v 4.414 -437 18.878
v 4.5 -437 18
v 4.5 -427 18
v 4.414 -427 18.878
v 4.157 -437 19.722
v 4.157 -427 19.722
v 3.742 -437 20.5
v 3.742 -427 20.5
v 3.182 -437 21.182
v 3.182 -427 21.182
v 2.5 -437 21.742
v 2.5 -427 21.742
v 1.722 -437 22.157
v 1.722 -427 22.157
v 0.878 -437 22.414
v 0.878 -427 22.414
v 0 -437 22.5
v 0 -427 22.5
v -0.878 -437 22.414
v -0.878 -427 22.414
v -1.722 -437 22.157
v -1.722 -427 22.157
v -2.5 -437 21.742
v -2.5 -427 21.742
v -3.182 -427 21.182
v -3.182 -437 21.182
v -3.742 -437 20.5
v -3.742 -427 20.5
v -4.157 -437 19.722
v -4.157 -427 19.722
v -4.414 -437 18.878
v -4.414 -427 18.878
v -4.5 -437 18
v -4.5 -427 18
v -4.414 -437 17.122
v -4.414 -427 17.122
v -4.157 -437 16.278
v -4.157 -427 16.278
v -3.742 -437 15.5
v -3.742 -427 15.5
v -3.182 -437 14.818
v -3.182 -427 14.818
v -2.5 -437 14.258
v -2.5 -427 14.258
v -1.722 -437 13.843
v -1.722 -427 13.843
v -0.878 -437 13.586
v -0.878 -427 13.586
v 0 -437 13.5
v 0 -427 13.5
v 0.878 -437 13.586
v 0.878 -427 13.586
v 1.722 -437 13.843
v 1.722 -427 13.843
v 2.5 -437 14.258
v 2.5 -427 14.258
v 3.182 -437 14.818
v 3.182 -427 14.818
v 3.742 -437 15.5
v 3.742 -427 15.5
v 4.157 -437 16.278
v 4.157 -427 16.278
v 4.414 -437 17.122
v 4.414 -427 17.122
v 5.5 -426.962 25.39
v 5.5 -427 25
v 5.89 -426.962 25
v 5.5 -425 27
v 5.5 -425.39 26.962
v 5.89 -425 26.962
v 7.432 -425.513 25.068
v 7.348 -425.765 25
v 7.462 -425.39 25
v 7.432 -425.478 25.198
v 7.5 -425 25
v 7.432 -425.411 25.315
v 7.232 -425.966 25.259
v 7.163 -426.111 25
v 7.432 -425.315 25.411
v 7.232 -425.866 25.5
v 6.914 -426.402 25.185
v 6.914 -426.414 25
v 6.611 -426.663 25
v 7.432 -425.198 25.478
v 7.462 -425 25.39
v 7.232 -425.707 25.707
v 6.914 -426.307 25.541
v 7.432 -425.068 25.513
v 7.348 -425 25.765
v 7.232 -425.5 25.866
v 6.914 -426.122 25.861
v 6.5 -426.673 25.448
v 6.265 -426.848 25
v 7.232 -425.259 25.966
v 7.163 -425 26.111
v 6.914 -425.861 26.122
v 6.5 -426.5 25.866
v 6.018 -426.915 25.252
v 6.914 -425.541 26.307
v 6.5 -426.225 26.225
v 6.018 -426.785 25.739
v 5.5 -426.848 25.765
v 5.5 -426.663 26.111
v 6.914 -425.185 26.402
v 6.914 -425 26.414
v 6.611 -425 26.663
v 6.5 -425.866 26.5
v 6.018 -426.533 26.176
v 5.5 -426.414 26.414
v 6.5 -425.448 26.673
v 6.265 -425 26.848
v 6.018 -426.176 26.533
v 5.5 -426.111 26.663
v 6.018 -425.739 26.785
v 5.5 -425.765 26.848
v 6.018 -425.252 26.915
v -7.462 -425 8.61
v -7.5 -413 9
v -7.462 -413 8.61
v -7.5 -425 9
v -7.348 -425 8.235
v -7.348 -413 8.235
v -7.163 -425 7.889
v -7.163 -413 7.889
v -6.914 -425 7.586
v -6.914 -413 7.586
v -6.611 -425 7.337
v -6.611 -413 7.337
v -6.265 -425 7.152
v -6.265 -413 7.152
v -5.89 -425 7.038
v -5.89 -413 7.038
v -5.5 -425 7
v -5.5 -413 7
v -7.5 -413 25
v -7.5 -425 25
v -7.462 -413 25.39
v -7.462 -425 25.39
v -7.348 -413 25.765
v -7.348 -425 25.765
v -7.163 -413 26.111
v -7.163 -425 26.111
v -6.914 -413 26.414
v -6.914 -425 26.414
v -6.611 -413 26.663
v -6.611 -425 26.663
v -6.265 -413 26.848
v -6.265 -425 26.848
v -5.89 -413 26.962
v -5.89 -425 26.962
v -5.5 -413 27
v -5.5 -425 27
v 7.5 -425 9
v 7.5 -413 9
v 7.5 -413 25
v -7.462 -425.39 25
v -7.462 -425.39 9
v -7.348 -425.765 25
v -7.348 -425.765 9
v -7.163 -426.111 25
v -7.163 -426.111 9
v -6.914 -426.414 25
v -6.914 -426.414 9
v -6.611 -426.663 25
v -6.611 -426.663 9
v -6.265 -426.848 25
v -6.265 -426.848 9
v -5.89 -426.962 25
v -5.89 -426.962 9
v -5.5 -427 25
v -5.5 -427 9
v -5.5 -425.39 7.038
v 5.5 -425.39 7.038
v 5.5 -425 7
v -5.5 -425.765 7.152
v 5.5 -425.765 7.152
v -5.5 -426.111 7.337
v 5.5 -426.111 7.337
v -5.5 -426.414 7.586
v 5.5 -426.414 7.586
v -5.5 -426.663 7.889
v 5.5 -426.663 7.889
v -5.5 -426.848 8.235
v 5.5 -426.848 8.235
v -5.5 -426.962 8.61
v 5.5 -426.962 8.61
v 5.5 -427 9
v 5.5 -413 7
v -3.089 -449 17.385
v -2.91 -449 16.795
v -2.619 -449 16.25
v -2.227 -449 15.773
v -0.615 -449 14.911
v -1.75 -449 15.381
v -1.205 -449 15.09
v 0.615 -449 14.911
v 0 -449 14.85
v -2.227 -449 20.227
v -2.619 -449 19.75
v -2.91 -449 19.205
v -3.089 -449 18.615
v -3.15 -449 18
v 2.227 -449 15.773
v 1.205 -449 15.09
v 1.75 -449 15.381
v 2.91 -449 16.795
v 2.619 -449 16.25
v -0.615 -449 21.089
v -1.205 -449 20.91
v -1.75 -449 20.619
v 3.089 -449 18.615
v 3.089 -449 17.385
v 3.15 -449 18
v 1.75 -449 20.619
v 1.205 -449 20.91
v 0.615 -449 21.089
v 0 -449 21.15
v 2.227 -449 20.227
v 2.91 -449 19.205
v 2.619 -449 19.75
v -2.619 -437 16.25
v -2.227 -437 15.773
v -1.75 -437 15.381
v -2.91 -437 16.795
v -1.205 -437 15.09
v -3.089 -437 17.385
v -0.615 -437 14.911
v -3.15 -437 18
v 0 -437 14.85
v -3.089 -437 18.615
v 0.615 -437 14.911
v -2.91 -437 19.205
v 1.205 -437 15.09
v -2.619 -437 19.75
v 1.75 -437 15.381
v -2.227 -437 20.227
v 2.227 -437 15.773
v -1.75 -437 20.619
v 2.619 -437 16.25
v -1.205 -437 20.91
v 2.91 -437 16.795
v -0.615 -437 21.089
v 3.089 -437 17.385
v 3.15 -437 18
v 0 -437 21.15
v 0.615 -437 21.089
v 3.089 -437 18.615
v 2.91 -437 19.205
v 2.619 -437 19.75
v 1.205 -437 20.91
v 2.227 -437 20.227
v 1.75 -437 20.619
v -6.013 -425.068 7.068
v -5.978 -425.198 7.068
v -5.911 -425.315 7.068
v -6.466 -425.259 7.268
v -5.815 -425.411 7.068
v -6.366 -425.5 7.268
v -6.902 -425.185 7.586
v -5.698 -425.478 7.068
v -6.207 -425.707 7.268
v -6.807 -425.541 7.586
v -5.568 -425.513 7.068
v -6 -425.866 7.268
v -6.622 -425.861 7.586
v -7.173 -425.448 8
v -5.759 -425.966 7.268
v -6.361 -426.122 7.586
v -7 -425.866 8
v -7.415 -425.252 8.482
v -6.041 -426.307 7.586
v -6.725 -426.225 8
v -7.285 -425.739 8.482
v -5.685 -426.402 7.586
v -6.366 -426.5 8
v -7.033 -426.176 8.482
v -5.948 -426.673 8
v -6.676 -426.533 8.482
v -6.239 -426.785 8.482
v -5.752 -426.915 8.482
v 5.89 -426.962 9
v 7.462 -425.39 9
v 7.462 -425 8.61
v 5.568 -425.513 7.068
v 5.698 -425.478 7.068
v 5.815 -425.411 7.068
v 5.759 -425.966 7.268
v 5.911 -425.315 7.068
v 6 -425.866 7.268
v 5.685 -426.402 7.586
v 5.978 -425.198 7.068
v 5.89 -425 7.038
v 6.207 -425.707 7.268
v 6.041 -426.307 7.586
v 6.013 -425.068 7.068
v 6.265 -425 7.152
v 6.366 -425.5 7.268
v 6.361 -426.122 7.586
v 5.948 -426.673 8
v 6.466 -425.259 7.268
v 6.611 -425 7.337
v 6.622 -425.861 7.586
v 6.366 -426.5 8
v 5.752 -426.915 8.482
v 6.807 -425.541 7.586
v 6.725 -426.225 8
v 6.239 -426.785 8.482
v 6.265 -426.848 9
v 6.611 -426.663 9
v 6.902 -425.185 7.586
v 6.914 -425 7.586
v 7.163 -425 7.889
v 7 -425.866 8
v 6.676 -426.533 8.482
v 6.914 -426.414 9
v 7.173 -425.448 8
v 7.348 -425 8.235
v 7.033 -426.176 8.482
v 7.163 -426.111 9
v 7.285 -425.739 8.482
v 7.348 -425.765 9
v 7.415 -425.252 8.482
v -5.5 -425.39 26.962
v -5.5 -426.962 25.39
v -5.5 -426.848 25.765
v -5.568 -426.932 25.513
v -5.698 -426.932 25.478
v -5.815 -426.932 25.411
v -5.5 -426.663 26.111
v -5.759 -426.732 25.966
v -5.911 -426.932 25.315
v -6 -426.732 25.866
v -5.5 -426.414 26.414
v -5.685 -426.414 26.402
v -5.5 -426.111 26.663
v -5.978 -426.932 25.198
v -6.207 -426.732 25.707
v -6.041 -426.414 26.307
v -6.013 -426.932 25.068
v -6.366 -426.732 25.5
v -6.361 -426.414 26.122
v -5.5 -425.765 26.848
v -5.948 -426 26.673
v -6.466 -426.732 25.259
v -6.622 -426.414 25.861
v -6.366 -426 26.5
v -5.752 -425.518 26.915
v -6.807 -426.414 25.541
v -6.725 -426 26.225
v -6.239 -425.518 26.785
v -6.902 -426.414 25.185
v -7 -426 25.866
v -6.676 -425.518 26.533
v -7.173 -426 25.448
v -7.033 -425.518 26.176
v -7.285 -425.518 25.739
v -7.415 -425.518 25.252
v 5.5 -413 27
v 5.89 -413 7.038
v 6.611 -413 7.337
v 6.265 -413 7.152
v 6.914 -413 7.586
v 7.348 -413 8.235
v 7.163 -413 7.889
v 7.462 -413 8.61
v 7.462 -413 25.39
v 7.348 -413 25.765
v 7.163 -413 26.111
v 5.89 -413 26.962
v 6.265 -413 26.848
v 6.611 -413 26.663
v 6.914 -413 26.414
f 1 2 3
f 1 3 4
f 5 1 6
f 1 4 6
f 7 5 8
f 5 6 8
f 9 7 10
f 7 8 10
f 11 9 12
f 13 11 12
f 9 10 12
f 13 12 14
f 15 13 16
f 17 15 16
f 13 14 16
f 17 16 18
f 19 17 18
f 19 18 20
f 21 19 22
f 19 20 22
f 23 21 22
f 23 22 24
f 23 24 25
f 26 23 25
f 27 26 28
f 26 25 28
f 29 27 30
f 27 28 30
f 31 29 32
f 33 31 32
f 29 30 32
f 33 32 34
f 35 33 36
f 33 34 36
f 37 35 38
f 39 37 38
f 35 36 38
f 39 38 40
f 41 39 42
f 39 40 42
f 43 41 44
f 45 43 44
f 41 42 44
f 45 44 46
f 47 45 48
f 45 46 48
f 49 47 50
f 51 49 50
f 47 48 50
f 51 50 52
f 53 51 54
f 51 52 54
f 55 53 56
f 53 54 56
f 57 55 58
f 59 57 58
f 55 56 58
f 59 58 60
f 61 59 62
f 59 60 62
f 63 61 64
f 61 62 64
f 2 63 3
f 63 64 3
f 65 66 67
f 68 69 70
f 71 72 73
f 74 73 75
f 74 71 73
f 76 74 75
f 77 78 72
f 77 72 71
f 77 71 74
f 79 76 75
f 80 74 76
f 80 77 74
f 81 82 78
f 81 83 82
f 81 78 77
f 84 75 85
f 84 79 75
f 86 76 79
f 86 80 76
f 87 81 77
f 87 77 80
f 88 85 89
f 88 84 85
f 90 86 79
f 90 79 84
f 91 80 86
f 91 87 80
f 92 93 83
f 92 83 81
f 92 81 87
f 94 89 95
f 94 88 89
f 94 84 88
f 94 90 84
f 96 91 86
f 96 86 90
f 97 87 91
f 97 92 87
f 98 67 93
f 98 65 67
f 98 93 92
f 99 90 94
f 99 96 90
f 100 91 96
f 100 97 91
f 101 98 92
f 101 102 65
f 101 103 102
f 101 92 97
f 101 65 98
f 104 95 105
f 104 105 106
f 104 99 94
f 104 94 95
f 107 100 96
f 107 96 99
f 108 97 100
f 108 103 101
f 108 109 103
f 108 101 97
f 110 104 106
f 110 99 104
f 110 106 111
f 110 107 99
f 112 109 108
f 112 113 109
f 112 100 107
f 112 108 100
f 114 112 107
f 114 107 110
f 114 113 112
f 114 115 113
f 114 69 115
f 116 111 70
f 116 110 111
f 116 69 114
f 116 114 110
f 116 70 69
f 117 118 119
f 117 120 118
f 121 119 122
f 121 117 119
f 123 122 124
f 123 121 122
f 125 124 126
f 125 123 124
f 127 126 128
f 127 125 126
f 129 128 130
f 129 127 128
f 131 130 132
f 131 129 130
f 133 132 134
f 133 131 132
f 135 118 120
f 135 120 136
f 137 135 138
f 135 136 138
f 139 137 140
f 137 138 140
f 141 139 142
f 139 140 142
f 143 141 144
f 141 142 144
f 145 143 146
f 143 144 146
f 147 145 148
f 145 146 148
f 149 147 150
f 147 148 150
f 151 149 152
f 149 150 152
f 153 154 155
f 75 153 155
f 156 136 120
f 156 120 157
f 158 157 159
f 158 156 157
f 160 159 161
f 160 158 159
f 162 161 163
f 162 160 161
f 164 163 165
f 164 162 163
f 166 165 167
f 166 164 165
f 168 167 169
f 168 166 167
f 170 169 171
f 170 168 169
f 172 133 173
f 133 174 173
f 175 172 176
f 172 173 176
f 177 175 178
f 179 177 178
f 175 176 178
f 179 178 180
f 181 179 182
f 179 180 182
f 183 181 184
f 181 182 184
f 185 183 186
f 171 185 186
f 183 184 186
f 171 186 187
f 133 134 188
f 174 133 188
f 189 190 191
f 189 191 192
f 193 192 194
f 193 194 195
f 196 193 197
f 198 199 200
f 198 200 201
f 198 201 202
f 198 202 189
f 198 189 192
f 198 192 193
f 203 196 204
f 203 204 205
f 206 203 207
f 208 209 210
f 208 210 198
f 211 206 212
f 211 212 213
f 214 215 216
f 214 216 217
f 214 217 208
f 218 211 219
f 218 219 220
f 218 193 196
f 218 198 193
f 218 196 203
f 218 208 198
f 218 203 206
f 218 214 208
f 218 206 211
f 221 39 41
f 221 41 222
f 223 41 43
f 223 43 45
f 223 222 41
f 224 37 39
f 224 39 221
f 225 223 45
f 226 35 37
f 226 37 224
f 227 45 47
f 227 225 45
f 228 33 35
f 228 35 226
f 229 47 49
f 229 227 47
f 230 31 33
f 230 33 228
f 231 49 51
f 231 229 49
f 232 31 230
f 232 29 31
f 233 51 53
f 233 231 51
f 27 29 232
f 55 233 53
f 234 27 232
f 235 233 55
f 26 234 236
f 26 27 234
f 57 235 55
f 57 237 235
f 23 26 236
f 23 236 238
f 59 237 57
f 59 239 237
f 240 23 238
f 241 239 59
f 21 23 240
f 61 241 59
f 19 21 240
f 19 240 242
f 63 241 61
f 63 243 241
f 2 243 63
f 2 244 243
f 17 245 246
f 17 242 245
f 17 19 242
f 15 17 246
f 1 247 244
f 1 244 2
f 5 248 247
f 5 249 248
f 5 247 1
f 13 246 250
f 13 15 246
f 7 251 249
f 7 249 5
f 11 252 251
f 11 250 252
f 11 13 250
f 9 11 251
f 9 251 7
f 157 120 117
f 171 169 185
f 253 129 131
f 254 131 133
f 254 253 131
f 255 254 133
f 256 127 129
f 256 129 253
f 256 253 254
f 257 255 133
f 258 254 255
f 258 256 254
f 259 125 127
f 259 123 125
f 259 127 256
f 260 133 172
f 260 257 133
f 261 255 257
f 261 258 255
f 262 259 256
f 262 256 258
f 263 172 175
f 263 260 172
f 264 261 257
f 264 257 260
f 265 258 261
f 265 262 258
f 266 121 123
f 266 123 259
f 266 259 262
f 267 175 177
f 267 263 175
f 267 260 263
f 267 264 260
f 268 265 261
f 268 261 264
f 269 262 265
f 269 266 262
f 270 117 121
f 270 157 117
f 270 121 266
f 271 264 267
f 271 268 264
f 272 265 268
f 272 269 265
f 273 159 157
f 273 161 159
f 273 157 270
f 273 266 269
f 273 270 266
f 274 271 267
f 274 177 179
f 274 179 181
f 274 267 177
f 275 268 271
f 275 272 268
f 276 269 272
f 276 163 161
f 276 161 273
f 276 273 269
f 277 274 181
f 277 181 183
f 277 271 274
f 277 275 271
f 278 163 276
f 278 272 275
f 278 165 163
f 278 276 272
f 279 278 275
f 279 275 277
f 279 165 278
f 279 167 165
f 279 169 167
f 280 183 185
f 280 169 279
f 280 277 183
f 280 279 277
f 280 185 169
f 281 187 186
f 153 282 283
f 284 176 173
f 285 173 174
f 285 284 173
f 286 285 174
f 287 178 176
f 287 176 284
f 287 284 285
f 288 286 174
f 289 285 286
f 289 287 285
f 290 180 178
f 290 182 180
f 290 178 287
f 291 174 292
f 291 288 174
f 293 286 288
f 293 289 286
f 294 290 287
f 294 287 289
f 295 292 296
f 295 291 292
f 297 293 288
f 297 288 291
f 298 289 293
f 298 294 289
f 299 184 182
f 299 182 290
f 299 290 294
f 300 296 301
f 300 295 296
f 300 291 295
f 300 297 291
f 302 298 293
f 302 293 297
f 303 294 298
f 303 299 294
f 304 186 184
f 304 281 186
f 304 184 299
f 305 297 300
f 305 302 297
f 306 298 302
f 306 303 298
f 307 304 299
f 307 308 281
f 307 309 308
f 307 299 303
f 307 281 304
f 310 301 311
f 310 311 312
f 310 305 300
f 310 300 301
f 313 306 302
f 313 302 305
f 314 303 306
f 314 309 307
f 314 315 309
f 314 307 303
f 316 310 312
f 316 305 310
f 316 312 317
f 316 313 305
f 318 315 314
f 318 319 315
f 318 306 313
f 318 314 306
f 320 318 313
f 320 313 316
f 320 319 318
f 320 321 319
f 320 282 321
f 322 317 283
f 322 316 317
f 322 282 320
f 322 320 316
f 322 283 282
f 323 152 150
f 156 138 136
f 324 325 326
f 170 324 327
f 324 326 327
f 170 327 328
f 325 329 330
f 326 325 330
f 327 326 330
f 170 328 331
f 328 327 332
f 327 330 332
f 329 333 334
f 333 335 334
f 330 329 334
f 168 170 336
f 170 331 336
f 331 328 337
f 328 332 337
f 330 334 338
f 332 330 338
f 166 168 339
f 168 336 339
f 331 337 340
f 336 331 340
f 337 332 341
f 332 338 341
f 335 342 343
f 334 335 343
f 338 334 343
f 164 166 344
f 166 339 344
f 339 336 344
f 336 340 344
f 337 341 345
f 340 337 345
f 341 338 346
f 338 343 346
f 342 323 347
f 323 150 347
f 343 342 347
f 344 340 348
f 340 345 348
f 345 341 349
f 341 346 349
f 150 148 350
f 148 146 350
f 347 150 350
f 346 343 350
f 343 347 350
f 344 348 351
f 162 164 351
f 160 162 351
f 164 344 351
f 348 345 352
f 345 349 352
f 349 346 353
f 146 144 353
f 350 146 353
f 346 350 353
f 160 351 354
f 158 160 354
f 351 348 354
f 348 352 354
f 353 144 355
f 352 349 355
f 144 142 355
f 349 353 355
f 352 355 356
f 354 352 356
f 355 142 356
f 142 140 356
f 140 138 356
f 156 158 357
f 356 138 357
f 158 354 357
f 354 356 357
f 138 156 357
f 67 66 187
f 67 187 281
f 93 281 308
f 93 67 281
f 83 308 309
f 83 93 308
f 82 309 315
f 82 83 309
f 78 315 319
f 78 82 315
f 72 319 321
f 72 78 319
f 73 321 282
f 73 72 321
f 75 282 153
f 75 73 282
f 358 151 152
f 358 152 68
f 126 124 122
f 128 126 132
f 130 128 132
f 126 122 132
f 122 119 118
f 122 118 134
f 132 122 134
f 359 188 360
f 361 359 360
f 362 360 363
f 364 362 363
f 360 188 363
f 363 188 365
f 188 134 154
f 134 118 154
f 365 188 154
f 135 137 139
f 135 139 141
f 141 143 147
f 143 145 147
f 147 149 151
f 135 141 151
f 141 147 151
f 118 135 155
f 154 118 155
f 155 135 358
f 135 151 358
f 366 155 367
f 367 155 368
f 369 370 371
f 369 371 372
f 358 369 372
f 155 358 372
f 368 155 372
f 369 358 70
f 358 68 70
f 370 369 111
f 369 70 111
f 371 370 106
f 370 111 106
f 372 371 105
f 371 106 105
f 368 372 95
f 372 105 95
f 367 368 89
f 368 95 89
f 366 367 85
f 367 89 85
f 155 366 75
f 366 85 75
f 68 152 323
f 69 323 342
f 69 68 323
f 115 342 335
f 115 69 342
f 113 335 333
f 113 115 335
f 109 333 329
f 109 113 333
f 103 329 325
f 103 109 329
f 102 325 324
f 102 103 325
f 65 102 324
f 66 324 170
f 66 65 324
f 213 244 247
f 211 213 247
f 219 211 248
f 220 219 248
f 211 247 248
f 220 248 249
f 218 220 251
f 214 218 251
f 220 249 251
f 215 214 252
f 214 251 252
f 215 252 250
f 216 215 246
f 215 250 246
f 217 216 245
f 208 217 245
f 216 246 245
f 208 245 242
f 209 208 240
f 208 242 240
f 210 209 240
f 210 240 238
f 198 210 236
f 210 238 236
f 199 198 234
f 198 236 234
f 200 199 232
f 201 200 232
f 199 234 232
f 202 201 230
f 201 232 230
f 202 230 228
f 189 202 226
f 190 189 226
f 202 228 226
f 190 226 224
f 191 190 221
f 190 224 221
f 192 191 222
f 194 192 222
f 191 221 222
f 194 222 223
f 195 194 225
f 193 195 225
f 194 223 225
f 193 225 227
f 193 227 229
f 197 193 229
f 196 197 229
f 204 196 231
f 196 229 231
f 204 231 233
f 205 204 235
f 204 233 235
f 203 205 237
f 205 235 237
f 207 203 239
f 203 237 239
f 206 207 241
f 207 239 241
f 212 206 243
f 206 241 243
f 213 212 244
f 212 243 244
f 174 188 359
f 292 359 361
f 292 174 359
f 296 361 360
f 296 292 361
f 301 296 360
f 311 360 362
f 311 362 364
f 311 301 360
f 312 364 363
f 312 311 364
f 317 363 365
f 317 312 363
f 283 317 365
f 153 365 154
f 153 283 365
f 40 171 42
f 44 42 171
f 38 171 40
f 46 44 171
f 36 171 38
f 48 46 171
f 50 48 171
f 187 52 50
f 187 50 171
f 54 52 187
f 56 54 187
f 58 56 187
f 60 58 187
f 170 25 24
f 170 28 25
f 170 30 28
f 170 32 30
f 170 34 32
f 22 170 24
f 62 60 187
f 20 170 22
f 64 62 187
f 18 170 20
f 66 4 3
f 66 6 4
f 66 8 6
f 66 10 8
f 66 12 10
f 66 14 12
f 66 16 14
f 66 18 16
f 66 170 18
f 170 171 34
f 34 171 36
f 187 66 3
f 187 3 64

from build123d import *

# Parameters (mm, degrees)
SKETCH001_W  = 15
SKETCH001_H  = 20
PAD001_DEPTH = 14
SKETCH002_R  = 4.5
PAD002_DEPTH = 10
SKETCH003_R  = 3.15
PAD003_DEPTH = 12
FILLET_R     = 2


with BuildPart() as part:
    # Sketch001 → Pad001 (new body)
    with BuildSketch(Plane.XZ):
        Rectangle(SKETCH001_W, SKETCH001_H)
    extrude(amount=PAD001_DEPTH)

    # Sketch002 → Pad002 (join)
    with BuildSketch(Plane(origin=(0, -14, 1), x_dir=(1, 0, 0), z_dir=(0, -1, 0))):
        Circle(SKETCH002_R)
    extrude(amount=PAD002_DEPTH)

    # Sketch003 → Pad003 (join)
    with BuildSketch(Plane(origin=(0, -24, 1), x_dir=(1, 0, 0), z_dir=(0, -1, 0))):
        Circle(SKETCH003_R)
    extrude(amount=PAD003_DEPTH)

    # Fillet
    fillet_edges = [part.edges().sort_by_distance(p)[0] for p in [
        (-7.5, -7, 10),
        (0, -14, 10),
        (-7.5, -14, 0),
        (7.5, -14, 0),
        (-7.5, -7, -10),
        (0, -14, -10),
        (7.5, -7, -10),
        (7.5, -7, 10),
    ]]
    fillet(fillet_edges, radius=FILLET_R)


with BuildPart() as part_1:
    # Body001 placement: moved
    add(part.part.moved(Location((0, -413, 17))))


solid = part_1.part
